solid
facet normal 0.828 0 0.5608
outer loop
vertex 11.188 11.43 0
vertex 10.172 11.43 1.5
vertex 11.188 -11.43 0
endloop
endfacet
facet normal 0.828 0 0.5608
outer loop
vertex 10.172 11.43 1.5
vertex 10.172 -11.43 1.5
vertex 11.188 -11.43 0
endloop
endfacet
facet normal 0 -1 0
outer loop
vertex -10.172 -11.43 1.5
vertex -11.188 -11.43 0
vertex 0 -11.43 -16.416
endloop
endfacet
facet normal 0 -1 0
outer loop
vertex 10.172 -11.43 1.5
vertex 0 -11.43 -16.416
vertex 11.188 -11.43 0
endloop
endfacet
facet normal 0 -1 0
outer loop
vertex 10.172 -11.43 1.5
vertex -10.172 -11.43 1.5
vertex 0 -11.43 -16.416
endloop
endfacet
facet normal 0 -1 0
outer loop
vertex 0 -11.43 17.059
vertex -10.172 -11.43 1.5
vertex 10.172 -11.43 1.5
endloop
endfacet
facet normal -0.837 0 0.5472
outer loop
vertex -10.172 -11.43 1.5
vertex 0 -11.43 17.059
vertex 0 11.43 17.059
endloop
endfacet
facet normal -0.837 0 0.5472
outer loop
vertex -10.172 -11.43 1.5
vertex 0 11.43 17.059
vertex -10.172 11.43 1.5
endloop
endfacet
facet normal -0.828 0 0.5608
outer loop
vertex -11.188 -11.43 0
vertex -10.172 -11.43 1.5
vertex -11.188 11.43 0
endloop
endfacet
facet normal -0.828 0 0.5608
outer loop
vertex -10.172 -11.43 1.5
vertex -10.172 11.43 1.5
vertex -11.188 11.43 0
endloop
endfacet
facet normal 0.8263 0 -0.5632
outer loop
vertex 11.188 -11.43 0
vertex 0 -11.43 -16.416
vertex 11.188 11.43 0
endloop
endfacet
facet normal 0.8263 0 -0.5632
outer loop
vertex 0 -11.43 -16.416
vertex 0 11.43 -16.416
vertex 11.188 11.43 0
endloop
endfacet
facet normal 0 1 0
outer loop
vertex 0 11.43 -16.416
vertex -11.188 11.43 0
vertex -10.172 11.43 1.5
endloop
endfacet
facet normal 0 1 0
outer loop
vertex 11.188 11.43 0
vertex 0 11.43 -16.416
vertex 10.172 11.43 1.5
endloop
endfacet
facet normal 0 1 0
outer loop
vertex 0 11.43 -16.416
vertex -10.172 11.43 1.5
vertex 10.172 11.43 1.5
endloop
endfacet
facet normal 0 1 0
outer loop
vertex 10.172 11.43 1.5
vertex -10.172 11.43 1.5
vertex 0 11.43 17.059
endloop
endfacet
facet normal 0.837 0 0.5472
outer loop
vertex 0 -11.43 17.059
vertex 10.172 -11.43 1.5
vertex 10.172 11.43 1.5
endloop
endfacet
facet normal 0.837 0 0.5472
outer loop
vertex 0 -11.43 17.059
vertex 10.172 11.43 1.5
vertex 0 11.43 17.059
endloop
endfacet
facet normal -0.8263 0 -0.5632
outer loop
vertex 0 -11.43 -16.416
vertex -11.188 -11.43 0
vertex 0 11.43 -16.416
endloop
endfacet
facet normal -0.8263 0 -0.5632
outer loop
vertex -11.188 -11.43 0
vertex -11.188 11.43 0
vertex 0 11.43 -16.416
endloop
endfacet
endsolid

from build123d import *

# Parameters (mm, degrees)
F1_DEPTH  = 6.35
F2_DEPTH  = 6.35
F4_DEPTH  = 2.54
F5_DEPTH  = 17.78
F8_DEPTH  = 2.54
F9_DEPTH  = 22.86
F10_DEPTH = 25.4
F11_DEPTH = 25.4


with BuildPart() as f1:
    # F0 (on Front) → F1 (new body)
    with BuildSketch(Plane.XZ):
        with BuildLine():
            add(Edge.make_bspline(
                [(-6.31646486, -27.194801718), (-9.1682856642, -24.4888721836), (-15.01463102, -18.9416096965), (-26.1820827955, -11.5743265752), (-33.6944043342, -9.1980832111), (-37.3292528093, -8.048334159)],
                knots=[0, 0, 0, 0, 0.3295571506, 0.6756051833, 1, 1, 1, 1], degree=3))
            Line((-6.31646486, -27.194801718), (0, -29.8242773861))
            Line((0, -29.8242773861), (6.31646486, -27.194801718))
            add(Edge.make_bspline(
                [(6.31646486, -27.194801718), (9.1682856642, -24.4888721836), (15.01463102, -18.9416096965), (26.1820827955, -11.5743265752), (33.6944043342, -9.1980832111), (37.3292528093, -8.048334159)],
                knots=[0, 0, 0, 0, 0.3295571506, 0.6756051833, 1, 1, 1, 1], degree=3))
            Line((37.3292528093, -8.048334159), (37.3292528093, -3.7900002208))
            add(Edge.make_bspline(
                [(37.3292528093, -3.7900002208), (38.0491431813, -3.543982173), (39.5145632284, -3.0431840055), (42.5984180868, -2.1192699685), (42.5169275679, -2.0102551614), (42.508341372, -1.9987688866)],
                knots=[0, 0, 0, 0, 0.4634814578, 0.94347007, 1, 1, 1, 1], degree=3))
            add(Edge.make_bspline(
                [(42.508341372, -1.9987688866), (40.4226176054, -0.0574224426), (36.0974058378, 3.9683908595), (33.1087810716, 9.8160060059), (31.561344862, 12.8437569365)],
                knots=[0, 0, 0, 0, 0.4822246583, 1, 1, 1, 1], degree=3))
            add(Edge.make_bspline(
                [(31.561344862, 12.8437569365), (30.594199091, 12.4764083462), (28.7192506637, 11.7642513143), (27.1772169029, 10.7890902407), (26.4306031168, 10.3169418871)],
                knots=[0, 0, 0, 0, 0.5158252658, 1, 1, 1, 1], degree=3))
            Line((26.4306031168, 10.3169418871), (23.9546149969, 12.8437569365))
            add(Edge.make_bspline(
                [(23.9546149969, 12.8437569365), (21.8130862803, 11.5707804719), (17.2050472404, 8.8316506157), (12.6243071994, 4.0564626093), (10.1724090055, 1.5004837187)],
                knots=[0, 0, 0, 0, 0.4647375376, 1, 1, 1, 1], degree=3))
            Line((10.1724090055, 1.5004837187), (0, 17.0586332679))
            Line((0, 17.0586332679), (-10.1724090055, 1.5004837187))
            add(Edge.make_bspline(
                [(-23.9546149969, 12.8437569365), (-21.8130862803, 11.5707804719), (-17.2050472404, 8.8316506157), (-12.6243071994, 4.0564626093), (-10.1724090055, 1.5004837187)],
                knots=[0, 0, 0, 0, 0.4647375376, 1, 1, 1, 1], degree=3))
            Line((-23.9546149969, 12.8437569365), (-26.4306031168, 10.3169418871))
            add(Edge.make_bspline(
                [(-31.561344862, 12.8437569365), (-30.594199091, 12.4764083462), (-28.7192506637, 11.7642513143), (-27.1772169029, 10.7890902407), (-26.4306031168, 10.3169418871)],
                knots=[0, 0, 0, 0, 0.5158252658, 1, 1, 1, 1], degree=3))
            add(Edge.make_bspline(
                [(-42.508341372, -1.9987688866), (-40.4226176054, -0.0574224426), (-36.0974058378, 3.9683908595), (-33.1087810716, 9.8160060059), (-31.561344862, 12.8437569365)],
                knots=[0, 0, 0, 0, 0.4822246583, 1, 1, 1, 1], degree=3))
            add(Edge.make_bspline(
                [(-37.3292528093, -3.7900002208), (-38.0491431813, -3.543982173), (-39.5145632284, -3.0431840055), (-42.5984180868, -2.1192699685), (-42.5169275679, -2.0102551614), (-42.508341372, -1.9987688866)],
                knots=[0, 0, 0, 0, 0.4634814578, 0.94347007, 1, 1, 1, 1], degree=3))
            Line((-37.3292528093, -3.7900002208), (-37.3292528093, -8.048334159))
        make_face()
    extrude(amount=F1_DEPTH)


with BuildPart() as f1b:
    # F0 (on Front) → F1, piece 2 (new body)
    with BuildSketch(Plane.XZ):
        with BuildLine():
            add(Edge.make_bspline(
                [(-18.6576042324, -145.0307071209), (-16.4470923737, -143.6168373627), (-11.8703765425, -140.6895153127), (-8.9461028405, -135.445167753), (-7.4342265725, -132.7337920666)],
                knots=[0, 0, 0, 0, 0.4829908476, 1, 1, 1, 1], degree=3))
            Line((-18.6576042324, -145.0307071209), (-18.2394590229, -148.4000682831))
            Line((-18.2394590229, -148.4000682831), (-10.7216006145, -152.8928130865))
            Line((-10.7216006145, -152.8928130865), (-8.8469898328, -151.1953920126))
            add(Edge.make_bspline(
                [(0, -156.4966738224), (-1.9608597417, -156.2050199351), (-5.7919516765, -155.6351918991), (-7.8448312846, -152.6518004701), (-8.8469898328, -151.1953920126)],
                knots=[0, 0, 0, 0, 0.5118279005, 1, 1, 1, 1], degree=3))
            add(Edge.make_bspline(
                [(0, -156.4966738224), (1.9608597417, -156.2050199351), (5.7919516765, -155.6351918991), (7.8448312846, -152.6518004701), (8.8469898328, -151.1953920126)],
                knots=[0, 0, 0, 0, 0.5118279005, 1, 1, 1, 1], degree=3))
            Line((8.8469898328, -151.1953920126), (10.7216006145, -152.8928130865))
            Line((10.7216006145, -152.8928130865), (18.2394590229, -148.4000682831))
            Line((18.2394590229, -148.4000682831), (18.6576042324, -145.0307071209))
            add(Edge.make_bspline(
                [(18.6576042324, -145.0307071209), (16.4470923737, -143.6168373627), (11.8703765425, -140.6895153127), (8.9461028405, -135.445167753), (7.4342265725, -132.7337920666)],
                knots=[0, 0, 0, 0, 0.4829908476, 1, 1, 1, 1], degree=3))
            Line((7.4342265725, -132.7337920666), (4.541859962, -130.4135769606))
            Line((4.541859962, -130.4135769606), (0, -130.4135769606))
            Line((0, -130.4135769606), (-4.541859962, -130.4135769606))
            Line((-4.541859962, -130.4135769606), (-7.4342265725, -132.7337920666))
        make_face()
    extrude(amount=F1_DEPTH)


with BuildPart() as f2:
    # F2 (new): a face of the model
    f2_faces = [f1.part.faces().sort_by_distance(p)[0] for p in [
        (0, 0, -5.0344679509),
    ]]
    extrude(f2_faces, amount=F2_DEPTH)


with BuildPart() as f2b:
    # F2#2 (new): a face of the model
    f2_2_faces = [f1b.part.faces().sort_by_distance(p)[0] for p in [
        (0, 0, -143.933409026),
    ]]
    extrude(f2_2_faces, amount=F2_DEPTH)


with BuildPart() as f1_1:
    add(f1.part)

    # F3 (on face) → F4 (join)
    with BuildSketch(Plane.XZ.offset(6.35)):
        with BuildLine():
            add(Edge.make_bspline(
                [(-26.4306031168, 10.3169418871), (-24.53023826, 9.3652181787), (-20.7503784131, 7.4722226216), (-15.975023215, 4.0917823159), (-12.273195981, 0.9667185074), (-11.187998578, 0)],
                knots=[0, 0, 0, 0, 0.2852309457, 0.5673294761, 0.8466572413, 0.8466572413, 0.8466572413, 0.8466572413], degree=3))
            add(Edge.make_bspline(
                [(-31.561344862, 12.8437569365), (-30.594199091, 12.4764083462), (-28.7192506637, 11.7642513143), (-27.1772169029, 10.7890902407), (-26.4306031168, 10.3169418871)],
                knots=[0, 0, 0, 0, 0.5158252658, 1, 1, 1, 1], degree=3))
            add(Edge.make_bspline(
                [(-42.508341372, -1.9987688866), (-40.4226176054, -0.0574224426), (-36.0974058378, 3.9683908595), (-33.1087810716, 9.8160060059), (-31.561344862, 12.8437569365)],
                knots=[0, 0, 0, 0, 0.4822246583, 1, 1, 1, 1], degree=3))
            add(Edge.make_bspline(
                [(-37.3292528093, -3.7900002208), (-38.0491431813, -3.543982173), (-39.5145632284, -3.0431840055), (-42.5984180868, -2.1192699685), (-42.5169275679, -2.0102551614), (-42.508341372, -1.9987688866)],
                knots=[0, 0, 0, 0, 0.4634814578, 0.94347007, 1, 1, 1, 1], degree=3))
            Line((-37.3292528093, -3.7900002208), (-37.3292528093, -8.048334159))
            add(Edge.make_bspline(
                [(-6.31646486, -27.194801718), (-9.1682856642, -24.4888721836), (-15.01463102, -18.9416096965), (-26.1820827955, -11.5743265752), (-33.6944043342, -9.1980832111), (-37.3292528093, -8.048334159)],
                knots=[0, 0, 0, 0, 0.3295571506, 0.6756051833, 1, 1, 1, 1], degree=3))
            Line((-6.31646486, -27.194801718), (0, -29.8242773861))
            Line((0, -29.8242773861), (6.31646486, -27.194801718))
            add(Edge.make_bspline(
                [(6.31646486, -27.194801718), (9.1682856642, -24.4888721836), (15.01463102, -18.9416096965), (26.1820827955, -11.5743265752), (33.6944043342, -9.1980832111), (37.3292528093, -8.048334159)],
                knots=[0, 0, 0, 0, 0.3295571506, 0.6756051833, 1, 1, 1, 1], degree=3))
            Line((37.3292528093, -8.048334159), (37.3292528093, -3.7900002208))
            add(Edge.make_bspline(
                [(37.3292528093, -3.7900002208), (38.0491431813, -3.543982173), (39.5145632284, -3.0431840055), (42.5984180868, -2.1192699685), (42.5169275679, -2.0102551614), (42.508341372, -1.9987688866)],
                knots=[0, 0, 0, 0, 0.4634814578, 0.94347007, 1, 1, 1, 1], degree=3))
            add(Edge.make_bspline(
                [(42.508341372, -1.9987688866), (40.4226176054, -0.0574224426), (36.0974058378, 3.9683908595), (33.1087810716, 9.8160060059), (31.561344862, 12.8437569365)],
                knots=[0, 0, 0, 0, 0.4822246583, 1, 1, 1, 1], degree=3))
            add(Edge.make_bspline(
                [(31.561344862, 12.8437569365), (30.594199091, 12.4764083462), (28.7192506637, 11.7642513143), (27.1772169029, 10.7890902407), (26.4306031168, 10.3169418871)],
                knots=[0, 0, 0, 0, 0.5158252658, 1, 1, 1, 1], degree=3))
            add(Edge.make_bspline(
                [(26.4306031168, 10.3169418871), (24.53023826, 9.3652181787), (20.7503784131, 7.4722226216), (15.975023215, 4.0917823159), (12.273195981, 0.9667185074), (11.187998578, 0)],
                knots=[0, 0, 0, 0, 0.2852309457, 0.5673294761, 0.8466572413, 0.8466572413, 0.8466572413, 0.8466572413], degree=3))
            add(Edge.make_bspline(
                [(11.187998578, 0), (10.5922570002, -0.5307001355), (10.2245255149, -0.8841646749), (9.8567940295, -1.2376292143)],
                knots=[0.8466572413, 0.8466572413, 0.8466572413, 0.8466572413, 1, 1, 1, 1], degree=3))
            Line((9.8567940295, -1.2376292143), (0, -16.4558514953))
            Line((0, -16.4558514953), (-9.8567940295, -1.2376292143))
            add(Edge.make_bspline(
                [(-11.187998578, 0), (-10.5922570002, -0.5307001355), (-10.2245255149, -0.8841646749), (-9.8567940295, -1.2376292143)],
                knots=[0.8466572413, 0.8466572413, 0.8466572413, 0.8466572413, 1, 1, 1, 1], degree=3))
        make_face()
        with BuildLine():
            Line((-10.1724090055, 1.5004837187), (-11.187998578, 0))
            add(Edge.make_bspline(
                [(-11.187998578, 0), (-10.5922570002, -0.5307001355), (-10.2245255149, -0.8841646749), (-9.8567940295, -1.2376292143)],
                knots=[0.8466572413, 0.8466572413, 0.8466572413, 0.8466572413, 1, 1, 1, 1], degree=3))
            Line((-9.8567940295, -1.2376292143), (0, -16.4558514953))
            Line((0, -16.4558514953), (9.8567940295, -1.2376292143))
            add(Edge.make_bspline(
                [(11.187998578, 0), (10.5922570002, -0.5307001355), (10.2245255149, -0.8841646749), (9.8567940295, -1.2376292143)],
                knots=[0.8466572413, 0.8466572413, 0.8466572413, 0.8466572413, 1, 1, 1, 1], degree=3))
            Line((11.187998578, 0), (10.1724090055, 1.5004837187))
            Line((10.1724090055, 1.5004837187), (0, 17.0586332679))
            Line((0, 17.0586332679), (-10.1724090055, 1.5004837187))
        make_face()
    extrude(amount=F4_DEPTH)


with BuildPart() as f5:
    # F5 (new): a face of the model
    f5_faces = [f1_1.part.faces().sort_by_distance(p)[0] for p in [
        (0, -8.89, -5.6400298016),
    ]]
    extrude(f5_faces, amount=-F5_DEPTH)


with BuildPart() as f1_2:
    add(f1_1.part)

    add(f5.part)  # F8 merges F5
    # F6 (on face) → F8 (join)
    with BuildSketch(Plane.XZ.offset(8.89)):
        Polygon((-10.1724090055, 1.5004837187), (-11.187998578, 0), (0, -16.4163466543), (11.187998578, 0), (10.1724090055, 1.5004837187), (0, 17.0586332679), align=None)
    extrude(amount=F8_DEPTH)

    # F9 (add): a face of the model
    f9_faces = [f1_2.faces().sort_by_distance(p)[0] for p in [
        (0, -11.43, 0.2055173709),
    ]]

    add(f2.part)  # F9 merges F2
    extrude(f9_faces, amount=-F9_DEPTH)

    # F7 (on face) + F4_face1 (on face) → F10 (cut)
    with BuildSketch(Plane.XZ.offset(8.89)):
        with BuildLine():
            Line((11.187998578, 0), (0, -16.4163466543))
            Line((0, -16.4163466543), (-11.187998578, 0))
            add(Edge.make_bspline(
                [(-26.4306031168, 10.3169418871), (-24.53023826, 9.3652181787), (-20.7503784131, 7.4722226216), (-15.975023215, 4.0917823159), (-12.273195981, 0.9667185074), (-11.187998578, 0)],
                knots=[0, 0, 0, 0, 0.2852309457, 0.5673294761, 0.8466572413, 0.8466572413, 0.8466572413, 0.8466572413], degree=3))
            add(Edge.make_bspline(
                [(-31.561344862, 12.8437569365), (-30.594199091, 12.4764083462), (-28.7192506637, 11.7642513143), (-27.1772169029, 10.7890902407), (-26.4306031168, 10.3169418871)],
                knots=[0, 0, 0, 0, 0.5158252658, 1, 1, 1, 1], degree=3))
            add(Edge.make_bspline(
                [(-42.508341372, -1.9987688866), (-40.4226176054, -0.0574224426), (-36.0974058378, 3.9683908595), (-33.1087810716, 9.8160060059), (-31.561344862, 12.8437569365)],
                knots=[0, 0, 0, 0, 0.4822246583, 1, 1, 1, 1], degree=3))
            add(Edge.make_bspline(
                [(-37.3292528093, -3.7900002208), (-38.0491431813, -3.543982173), (-39.5145632284, -3.0431840055), (-42.5984180868, -2.1192699685), (-42.5169275679, -2.0102551614), (-42.508341372, -1.9987688866)],
                knots=[0, 0, 0, 0, 0.4634814578, 0.94347007, 1, 1, 1, 1], degree=3))
            Line((-37.3292528093, -3.7900002208), (-37.3292528093, -8.048334159))
            add(Edge.make_bspline(
                [(-6.31646486, -27.194801718), (-9.1682856642, -24.4888721836), (-15.01463102, -18.9416096965), (-26.1820827955, -11.5743265752), (-33.6944043342, -9.1980832111), (-37.3292528093, -8.048334159)],
                knots=[0, 0, 0, 0, 0.3295571506, 0.6756051833, 1, 1, 1, 1], degree=3))
            Line((-6.31646486, -27.194801718), (0, -29.8242773861))
            Line((0, -29.8242773861), (6.31646486, -27.194801718))
            add(Edge.make_bspline(
                [(6.31646486, -27.194801718), (9.1682856642, -24.4888721836), (15.01463102, -18.9416096965), (26.1820827955, -11.5743265752), (33.6944043342, -9.1980832111), (37.3292528093, -8.048334159)],
                knots=[0, 0, 0, 0, 0.3295571506, 0.6756051833, 1, 1, 1, 1], degree=3))
            Line((37.3292528093, -8.048334159), (37.3292528093, -3.7900002208))
            add(Edge.make_bspline(
                [(37.3292528093, -3.7900002208), (38.0491431813, -3.543982173), (39.5145632284, -3.0431840055), (42.5984180868, -2.1192699685), (42.5169275679, -2.0102551614), (42.508341372, -1.9987688866)],
                knots=[0, 0, 0, 0, 0.4634814578, 0.94347007, 1, 1, 1, 1], degree=3))
            add(Edge.make_bspline(
                [(42.508341372, -1.9987688866), (40.4226176054, -0.0574224426), (36.0974058378, 3.9683908595), (33.1087810716, 9.8160060059), (31.561344862, 12.8437569365)],
                knots=[0, 0, 0, 0, 0.4822246583, 1, 1, 1, 1], degree=3))
            add(Edge.make_bspline(
                [(31.561344862, 12.8437569365), (30.594199091, 12.4764083462), (28.7192506637, 11.7642513143), (27.1772169029, 10.7890902407), (26.4306031168, 10.3169418871)],
                knots=[0, 0, 0, 0, 0.5158252658, 1, 1, 1, 1], degree=3))
            add(Edge.make_bspline(
                [(26.4306031168, 10.3169418871), (24.53023826, 9.3652181787), (20.7503784131, 7.4722226216), (15.975023215, 4.0917823159), (12.273195981, 0.9667185074), (11.187998578, 0)],
                knots=[0, 0, 0, 0, 0.2852309457, 0.5673294761, 0.8466572413, 0.8466572413, 0.8466572413, 0.8466572413], degree=3))
        make_face()
    with BuildSketch(Plane(origin=(-18.4067170544, -6.35, 7.1196103379), x_dir=(1, 0, 0), z_dir=(0, -1, 0))):
        with BuildLine():
            add(Edge.make_bspline(
                [(-8.0238860624, 3.1973315493), (-6.1235212057, 2.2456078409), (-2.3436613587, 0.3526122837), (2.4316938393, -3.027828022), (6.1335210734, -6.1528918305), (7.2187184764, -7.1196103379)],
                knots=[0, 0, 0, 0, 0.2852309457, 0.5673294761, 0.8466572413, 0.8466572413, 0.8466572413, 0.8466572413], degree=3))
            Line((7.2187184764, -7.1196103379), (8.2343080489, -5.6191266192))
            add(Edge.make_bspline(
                [(-5.5478979425, 5.7241465986), (-3.4063692259, 4.4511701341), (1.201669814, 1.7120402779), (5.782409855, -3.0631477285), (8.2343080489, -5.6191266192)],
                knots=[0, 0, 0, 0, 0.4647375376, 1, 1, 1, 1], degree=3))
            Line((-5.5478979425, 5.7241465986), (-8.0238860624, 3.1973315493))
        make_face()
        with BuildLine():
            Line((44.8373201711, 3.1973315493), (42.3613320513, 5.7241465986))
            add(Edge.make_bspline(
                [(42.3613320513, 5.7241465986), (40.2198033346, 4.4511701341), (35.6117642948, 1.7120402779), (31.0310242537, -3.0631477285), (28.5791260598, -5.6191266192)],
                knots=[0, 0, 0, 0, 0.4647375376, 1, 1, 1, 1], degree=3))
            Line((28.5791260598, -5.6191266192), (29.5947156323, -7.1196103379))
            add(Edge.make_bspline(
                [(44.8373201711, 3.1973315493), (42.9369553144, 2.2456078409), (39.1570954675, 0.3526122837), (34.3817402694, -3.027828022), (30.6799130354, -6.1528918305), (29.5947156323, -7.1196103379)],
                knots=[0, 0, 0, 0, 0.2852309457, 0.5673294761, 0.8466572413, 0.8466572413, 0.8466572413, 0.8466572413], degree=3))
        make_face()
    extrude(amount=-F10_DEPTH, mode=Mode.SUBTRACT)


with BuildPart() as f11_tool:
    # F11 (cut): a face of the model
    f11_faces = [f1b.part.faces().sort_by_distance(p)[0] for p in [
        (0, -6.35, -143.933409026),
    ]]
    extrude(f11_faces, amount=-F11_DEPTH)


with BuildPart() as f1b_1:
    add(f1b.part)

    # F11: cut by f11_tool
    add(f11_tool.part, mode=Mode.SUBTRACT)


with BuildPart() as f2b_1:
    add(f2b.part)

    # F11: cut by f11_tool
    add(f11_tool.part, mode=Mode.SUBTRACT)


solid = f1_2.part
